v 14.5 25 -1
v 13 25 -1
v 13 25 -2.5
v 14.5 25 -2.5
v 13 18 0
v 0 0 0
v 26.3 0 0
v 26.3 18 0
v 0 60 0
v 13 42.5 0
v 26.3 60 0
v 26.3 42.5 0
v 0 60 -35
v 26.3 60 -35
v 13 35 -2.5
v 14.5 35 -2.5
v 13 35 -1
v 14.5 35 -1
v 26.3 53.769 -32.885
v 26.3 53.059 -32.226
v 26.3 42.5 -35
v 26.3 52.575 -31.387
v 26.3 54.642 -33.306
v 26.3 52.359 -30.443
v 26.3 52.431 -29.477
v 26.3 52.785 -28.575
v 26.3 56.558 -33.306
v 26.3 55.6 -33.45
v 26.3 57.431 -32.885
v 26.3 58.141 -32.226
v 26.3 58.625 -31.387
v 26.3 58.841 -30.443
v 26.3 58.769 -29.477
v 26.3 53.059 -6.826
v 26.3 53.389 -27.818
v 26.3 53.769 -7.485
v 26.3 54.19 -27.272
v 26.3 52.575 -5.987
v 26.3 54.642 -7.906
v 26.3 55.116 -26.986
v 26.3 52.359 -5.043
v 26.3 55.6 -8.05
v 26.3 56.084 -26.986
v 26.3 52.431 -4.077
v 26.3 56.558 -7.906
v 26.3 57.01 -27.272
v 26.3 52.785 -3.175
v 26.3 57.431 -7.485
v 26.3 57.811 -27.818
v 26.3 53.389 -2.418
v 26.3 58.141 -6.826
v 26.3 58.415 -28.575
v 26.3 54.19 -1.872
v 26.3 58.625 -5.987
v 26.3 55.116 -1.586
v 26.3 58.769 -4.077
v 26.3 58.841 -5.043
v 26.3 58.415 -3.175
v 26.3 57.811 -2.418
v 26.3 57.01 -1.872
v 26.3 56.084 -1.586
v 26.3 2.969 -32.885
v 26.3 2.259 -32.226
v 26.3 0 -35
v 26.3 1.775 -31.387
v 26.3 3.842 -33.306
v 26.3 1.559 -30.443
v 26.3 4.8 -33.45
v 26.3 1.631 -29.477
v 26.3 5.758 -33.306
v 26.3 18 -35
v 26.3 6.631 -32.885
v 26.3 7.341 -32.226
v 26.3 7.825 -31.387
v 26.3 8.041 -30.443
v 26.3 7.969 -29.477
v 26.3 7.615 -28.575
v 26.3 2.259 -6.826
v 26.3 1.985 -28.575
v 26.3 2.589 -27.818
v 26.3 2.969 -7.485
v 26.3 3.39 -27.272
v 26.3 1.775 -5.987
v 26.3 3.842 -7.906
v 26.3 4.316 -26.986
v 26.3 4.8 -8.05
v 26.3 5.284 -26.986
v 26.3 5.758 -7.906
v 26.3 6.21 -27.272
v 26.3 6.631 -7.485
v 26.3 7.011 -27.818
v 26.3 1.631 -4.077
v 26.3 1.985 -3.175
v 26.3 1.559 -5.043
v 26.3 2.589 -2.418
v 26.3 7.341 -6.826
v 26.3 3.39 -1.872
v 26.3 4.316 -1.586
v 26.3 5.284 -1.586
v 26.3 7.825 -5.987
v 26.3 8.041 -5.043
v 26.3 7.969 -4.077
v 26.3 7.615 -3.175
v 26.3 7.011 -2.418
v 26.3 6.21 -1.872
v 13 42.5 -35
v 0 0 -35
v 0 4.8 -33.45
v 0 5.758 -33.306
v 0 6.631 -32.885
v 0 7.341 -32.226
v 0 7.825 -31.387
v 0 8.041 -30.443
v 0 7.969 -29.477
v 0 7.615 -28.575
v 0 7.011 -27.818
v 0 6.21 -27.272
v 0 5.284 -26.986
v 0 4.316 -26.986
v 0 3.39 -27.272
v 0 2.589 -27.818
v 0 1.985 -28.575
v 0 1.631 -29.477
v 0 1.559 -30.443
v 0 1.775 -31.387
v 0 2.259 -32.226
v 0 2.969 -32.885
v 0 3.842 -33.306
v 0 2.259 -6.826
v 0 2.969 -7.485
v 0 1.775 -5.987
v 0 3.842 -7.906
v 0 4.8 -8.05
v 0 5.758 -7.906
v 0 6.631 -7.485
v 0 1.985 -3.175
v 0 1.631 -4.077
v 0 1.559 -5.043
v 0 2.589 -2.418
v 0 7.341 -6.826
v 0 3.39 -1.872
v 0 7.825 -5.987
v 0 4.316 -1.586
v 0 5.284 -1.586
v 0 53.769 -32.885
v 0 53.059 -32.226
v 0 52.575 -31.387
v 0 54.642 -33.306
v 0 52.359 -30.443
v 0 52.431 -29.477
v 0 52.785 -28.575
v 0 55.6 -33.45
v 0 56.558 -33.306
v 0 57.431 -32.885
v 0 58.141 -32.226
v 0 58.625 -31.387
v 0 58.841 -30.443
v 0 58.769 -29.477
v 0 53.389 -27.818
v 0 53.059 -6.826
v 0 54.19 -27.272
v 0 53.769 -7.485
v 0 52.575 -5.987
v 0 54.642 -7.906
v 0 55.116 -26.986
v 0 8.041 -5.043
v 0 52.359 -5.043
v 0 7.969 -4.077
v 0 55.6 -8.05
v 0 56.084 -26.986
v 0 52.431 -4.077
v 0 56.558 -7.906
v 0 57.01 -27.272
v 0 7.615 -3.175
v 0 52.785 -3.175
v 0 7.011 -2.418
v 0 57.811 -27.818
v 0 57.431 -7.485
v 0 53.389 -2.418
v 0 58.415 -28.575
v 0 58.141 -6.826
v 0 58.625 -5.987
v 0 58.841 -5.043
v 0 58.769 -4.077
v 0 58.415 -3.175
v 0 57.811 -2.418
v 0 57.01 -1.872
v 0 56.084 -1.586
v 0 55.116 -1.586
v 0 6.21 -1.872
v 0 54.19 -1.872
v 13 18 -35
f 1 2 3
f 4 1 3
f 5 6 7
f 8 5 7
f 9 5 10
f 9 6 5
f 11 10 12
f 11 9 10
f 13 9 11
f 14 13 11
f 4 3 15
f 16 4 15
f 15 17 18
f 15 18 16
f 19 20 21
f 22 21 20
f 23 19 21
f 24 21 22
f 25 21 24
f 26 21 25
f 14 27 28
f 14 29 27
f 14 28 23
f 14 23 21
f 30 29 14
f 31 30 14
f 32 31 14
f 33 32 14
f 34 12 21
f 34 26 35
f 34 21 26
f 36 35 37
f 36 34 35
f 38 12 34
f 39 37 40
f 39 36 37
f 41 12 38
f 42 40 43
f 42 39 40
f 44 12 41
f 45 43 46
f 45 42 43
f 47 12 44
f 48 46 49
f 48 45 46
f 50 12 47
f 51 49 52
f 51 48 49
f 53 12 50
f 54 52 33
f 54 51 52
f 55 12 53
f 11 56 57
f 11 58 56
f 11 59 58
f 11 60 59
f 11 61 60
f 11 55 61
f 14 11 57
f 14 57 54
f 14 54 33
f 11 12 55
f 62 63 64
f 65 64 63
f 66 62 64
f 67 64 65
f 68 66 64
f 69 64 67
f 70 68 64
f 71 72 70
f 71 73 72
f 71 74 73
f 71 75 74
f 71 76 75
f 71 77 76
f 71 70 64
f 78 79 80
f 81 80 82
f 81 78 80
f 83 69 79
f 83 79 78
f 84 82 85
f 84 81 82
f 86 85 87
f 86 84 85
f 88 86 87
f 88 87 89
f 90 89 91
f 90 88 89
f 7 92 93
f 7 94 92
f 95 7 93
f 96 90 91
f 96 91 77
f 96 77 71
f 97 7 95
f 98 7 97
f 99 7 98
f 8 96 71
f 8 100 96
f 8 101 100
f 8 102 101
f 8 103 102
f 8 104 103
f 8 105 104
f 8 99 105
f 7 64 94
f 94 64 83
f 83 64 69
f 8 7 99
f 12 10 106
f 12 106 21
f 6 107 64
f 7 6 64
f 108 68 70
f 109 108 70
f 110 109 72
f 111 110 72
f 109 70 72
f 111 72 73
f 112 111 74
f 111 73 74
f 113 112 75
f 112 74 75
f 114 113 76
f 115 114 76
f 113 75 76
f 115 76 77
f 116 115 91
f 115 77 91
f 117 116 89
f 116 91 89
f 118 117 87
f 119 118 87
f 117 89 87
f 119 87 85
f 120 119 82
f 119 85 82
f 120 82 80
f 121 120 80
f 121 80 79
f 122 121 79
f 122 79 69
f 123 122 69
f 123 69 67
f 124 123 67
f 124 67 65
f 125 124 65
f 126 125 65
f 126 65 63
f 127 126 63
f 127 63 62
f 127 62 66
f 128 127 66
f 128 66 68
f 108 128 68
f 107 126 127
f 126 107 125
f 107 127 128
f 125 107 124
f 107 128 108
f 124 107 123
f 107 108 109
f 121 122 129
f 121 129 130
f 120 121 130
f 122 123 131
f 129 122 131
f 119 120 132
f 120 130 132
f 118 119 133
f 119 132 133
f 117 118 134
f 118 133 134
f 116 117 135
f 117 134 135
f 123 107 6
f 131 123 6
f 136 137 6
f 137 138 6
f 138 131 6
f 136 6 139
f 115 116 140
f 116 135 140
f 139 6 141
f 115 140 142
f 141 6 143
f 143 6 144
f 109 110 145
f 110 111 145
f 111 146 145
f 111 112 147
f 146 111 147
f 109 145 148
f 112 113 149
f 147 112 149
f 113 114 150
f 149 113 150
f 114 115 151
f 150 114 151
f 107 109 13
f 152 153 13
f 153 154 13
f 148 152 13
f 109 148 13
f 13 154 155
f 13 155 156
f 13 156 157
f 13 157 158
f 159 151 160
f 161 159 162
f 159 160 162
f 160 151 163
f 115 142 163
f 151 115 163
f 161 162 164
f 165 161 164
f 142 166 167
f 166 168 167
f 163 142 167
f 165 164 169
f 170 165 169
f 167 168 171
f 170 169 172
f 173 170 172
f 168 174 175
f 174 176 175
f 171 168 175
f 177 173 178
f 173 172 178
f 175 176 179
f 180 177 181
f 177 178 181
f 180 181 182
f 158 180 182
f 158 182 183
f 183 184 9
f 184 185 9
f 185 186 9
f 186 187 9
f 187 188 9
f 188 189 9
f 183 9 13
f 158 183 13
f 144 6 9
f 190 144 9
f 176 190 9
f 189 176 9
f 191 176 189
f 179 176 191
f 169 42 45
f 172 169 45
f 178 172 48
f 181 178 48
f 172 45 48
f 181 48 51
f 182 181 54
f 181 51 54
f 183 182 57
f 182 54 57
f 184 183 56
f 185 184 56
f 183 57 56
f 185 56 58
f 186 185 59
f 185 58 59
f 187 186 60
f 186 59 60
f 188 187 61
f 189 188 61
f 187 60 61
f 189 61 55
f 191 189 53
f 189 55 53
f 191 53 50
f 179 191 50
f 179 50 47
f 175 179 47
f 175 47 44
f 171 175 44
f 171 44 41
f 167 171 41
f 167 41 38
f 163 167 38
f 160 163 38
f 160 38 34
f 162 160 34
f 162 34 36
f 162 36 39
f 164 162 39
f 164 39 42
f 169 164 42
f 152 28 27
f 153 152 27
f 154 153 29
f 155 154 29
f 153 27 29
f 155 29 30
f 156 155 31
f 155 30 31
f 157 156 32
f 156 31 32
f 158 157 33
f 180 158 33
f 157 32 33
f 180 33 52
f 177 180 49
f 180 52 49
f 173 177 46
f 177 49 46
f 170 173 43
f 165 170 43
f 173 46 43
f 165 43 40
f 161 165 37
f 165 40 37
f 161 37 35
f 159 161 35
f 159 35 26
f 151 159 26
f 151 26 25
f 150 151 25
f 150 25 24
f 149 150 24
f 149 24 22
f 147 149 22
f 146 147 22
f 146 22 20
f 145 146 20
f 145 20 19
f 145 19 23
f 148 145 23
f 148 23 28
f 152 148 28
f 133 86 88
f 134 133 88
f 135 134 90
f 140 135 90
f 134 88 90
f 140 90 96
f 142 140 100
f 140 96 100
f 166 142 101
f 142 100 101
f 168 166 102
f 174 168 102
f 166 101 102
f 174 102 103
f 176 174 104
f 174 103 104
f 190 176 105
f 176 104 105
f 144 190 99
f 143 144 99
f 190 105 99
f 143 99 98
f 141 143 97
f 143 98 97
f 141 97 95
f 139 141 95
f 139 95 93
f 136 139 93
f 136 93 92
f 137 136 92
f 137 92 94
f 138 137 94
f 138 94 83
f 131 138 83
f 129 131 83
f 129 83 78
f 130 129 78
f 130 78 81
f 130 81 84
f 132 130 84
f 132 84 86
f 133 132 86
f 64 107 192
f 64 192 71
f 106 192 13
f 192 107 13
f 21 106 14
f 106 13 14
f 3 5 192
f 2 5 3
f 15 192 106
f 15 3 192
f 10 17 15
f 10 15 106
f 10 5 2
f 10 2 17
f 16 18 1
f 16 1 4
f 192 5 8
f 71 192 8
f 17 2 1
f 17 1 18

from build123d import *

# Parameters (mm, degrees)
SKETCH1_W           = 13
SKETCH1_H           = 60
BOSS_EXTRUDE1_DEPTH = 35
SKETCH3_W           = 1.5
SKETCH3_H           = 10
BOSS_EXTRUDE2_DEPTH = 1.5
SKETCH7_W           = 13.3
SKETCH7_H           = 17.5
SKETCH7_H_2         = 18
BOSS_EXTRUDE6_DEPTH = 35
SKETCH11_R          = 3.25
CUT_EXTRUDE2_DEPTH  = 27.3


with BuildPart() as part:
    # Sketch1 → Boss-Extrude1 (new body)
    with BuildSketch(Plane.XY):
        with Locations((6.5, 30)):
            Rectangle(SKETCH1_W, SKETCH1_H)
    extrude(amount=-BOSS_EXTRUDE1_DEPTH)

    # Sketch3 → Boss-Extrude2 (add)
    with BuildSketch(Plane(origin=(13, 0, 0), x_dir=(0, 0, -1), z_dir=(1, 0, 0))):
        with Locations((1.75, 30)):
            Rectangle(SKETCH3_W, SKETCH3_H)
    extrude(amount=BOSS_EXTRUDE2_DEPTH)

    # Sketch7 → Boss-Extrude6 (add)
    with BuildSketch(Plane.XY):
        with Locations((19.65, 51.25)):
            Rectangle(SKETCH7_W, SKETCH7_H)
        with Locations((19.65, 9)):
            Rectangle(SKETCH7_W, SKETCH7_H_2)
    extrude(amount=-BOSS_EXTRUDE6_DEPTH)

    # Sketch11 → Cut-Extrude2 (cut, through all)
    with BuildSketch(Plane(origin=(26.3, 0, 0), x_dir=(0, 0, -1), z_dir=(1, 0, 0))):
        with Locations((4.8, 4.8)):
            Circle(SKETCH11_R)
        with Locations((30.2, 4.8)):
            Circle(SKETCH11_R)
        with Locations((30.2, 55.6)):
            Circle(SKETCH11_R)
        with Locations((4.8, 55.6)):
            Circle(SKETCH11_R)
    extrude(amount=-CUT_EXTRUDE2_DEPTH, mode=Mode.SUBTRACT)


solid = part.part
